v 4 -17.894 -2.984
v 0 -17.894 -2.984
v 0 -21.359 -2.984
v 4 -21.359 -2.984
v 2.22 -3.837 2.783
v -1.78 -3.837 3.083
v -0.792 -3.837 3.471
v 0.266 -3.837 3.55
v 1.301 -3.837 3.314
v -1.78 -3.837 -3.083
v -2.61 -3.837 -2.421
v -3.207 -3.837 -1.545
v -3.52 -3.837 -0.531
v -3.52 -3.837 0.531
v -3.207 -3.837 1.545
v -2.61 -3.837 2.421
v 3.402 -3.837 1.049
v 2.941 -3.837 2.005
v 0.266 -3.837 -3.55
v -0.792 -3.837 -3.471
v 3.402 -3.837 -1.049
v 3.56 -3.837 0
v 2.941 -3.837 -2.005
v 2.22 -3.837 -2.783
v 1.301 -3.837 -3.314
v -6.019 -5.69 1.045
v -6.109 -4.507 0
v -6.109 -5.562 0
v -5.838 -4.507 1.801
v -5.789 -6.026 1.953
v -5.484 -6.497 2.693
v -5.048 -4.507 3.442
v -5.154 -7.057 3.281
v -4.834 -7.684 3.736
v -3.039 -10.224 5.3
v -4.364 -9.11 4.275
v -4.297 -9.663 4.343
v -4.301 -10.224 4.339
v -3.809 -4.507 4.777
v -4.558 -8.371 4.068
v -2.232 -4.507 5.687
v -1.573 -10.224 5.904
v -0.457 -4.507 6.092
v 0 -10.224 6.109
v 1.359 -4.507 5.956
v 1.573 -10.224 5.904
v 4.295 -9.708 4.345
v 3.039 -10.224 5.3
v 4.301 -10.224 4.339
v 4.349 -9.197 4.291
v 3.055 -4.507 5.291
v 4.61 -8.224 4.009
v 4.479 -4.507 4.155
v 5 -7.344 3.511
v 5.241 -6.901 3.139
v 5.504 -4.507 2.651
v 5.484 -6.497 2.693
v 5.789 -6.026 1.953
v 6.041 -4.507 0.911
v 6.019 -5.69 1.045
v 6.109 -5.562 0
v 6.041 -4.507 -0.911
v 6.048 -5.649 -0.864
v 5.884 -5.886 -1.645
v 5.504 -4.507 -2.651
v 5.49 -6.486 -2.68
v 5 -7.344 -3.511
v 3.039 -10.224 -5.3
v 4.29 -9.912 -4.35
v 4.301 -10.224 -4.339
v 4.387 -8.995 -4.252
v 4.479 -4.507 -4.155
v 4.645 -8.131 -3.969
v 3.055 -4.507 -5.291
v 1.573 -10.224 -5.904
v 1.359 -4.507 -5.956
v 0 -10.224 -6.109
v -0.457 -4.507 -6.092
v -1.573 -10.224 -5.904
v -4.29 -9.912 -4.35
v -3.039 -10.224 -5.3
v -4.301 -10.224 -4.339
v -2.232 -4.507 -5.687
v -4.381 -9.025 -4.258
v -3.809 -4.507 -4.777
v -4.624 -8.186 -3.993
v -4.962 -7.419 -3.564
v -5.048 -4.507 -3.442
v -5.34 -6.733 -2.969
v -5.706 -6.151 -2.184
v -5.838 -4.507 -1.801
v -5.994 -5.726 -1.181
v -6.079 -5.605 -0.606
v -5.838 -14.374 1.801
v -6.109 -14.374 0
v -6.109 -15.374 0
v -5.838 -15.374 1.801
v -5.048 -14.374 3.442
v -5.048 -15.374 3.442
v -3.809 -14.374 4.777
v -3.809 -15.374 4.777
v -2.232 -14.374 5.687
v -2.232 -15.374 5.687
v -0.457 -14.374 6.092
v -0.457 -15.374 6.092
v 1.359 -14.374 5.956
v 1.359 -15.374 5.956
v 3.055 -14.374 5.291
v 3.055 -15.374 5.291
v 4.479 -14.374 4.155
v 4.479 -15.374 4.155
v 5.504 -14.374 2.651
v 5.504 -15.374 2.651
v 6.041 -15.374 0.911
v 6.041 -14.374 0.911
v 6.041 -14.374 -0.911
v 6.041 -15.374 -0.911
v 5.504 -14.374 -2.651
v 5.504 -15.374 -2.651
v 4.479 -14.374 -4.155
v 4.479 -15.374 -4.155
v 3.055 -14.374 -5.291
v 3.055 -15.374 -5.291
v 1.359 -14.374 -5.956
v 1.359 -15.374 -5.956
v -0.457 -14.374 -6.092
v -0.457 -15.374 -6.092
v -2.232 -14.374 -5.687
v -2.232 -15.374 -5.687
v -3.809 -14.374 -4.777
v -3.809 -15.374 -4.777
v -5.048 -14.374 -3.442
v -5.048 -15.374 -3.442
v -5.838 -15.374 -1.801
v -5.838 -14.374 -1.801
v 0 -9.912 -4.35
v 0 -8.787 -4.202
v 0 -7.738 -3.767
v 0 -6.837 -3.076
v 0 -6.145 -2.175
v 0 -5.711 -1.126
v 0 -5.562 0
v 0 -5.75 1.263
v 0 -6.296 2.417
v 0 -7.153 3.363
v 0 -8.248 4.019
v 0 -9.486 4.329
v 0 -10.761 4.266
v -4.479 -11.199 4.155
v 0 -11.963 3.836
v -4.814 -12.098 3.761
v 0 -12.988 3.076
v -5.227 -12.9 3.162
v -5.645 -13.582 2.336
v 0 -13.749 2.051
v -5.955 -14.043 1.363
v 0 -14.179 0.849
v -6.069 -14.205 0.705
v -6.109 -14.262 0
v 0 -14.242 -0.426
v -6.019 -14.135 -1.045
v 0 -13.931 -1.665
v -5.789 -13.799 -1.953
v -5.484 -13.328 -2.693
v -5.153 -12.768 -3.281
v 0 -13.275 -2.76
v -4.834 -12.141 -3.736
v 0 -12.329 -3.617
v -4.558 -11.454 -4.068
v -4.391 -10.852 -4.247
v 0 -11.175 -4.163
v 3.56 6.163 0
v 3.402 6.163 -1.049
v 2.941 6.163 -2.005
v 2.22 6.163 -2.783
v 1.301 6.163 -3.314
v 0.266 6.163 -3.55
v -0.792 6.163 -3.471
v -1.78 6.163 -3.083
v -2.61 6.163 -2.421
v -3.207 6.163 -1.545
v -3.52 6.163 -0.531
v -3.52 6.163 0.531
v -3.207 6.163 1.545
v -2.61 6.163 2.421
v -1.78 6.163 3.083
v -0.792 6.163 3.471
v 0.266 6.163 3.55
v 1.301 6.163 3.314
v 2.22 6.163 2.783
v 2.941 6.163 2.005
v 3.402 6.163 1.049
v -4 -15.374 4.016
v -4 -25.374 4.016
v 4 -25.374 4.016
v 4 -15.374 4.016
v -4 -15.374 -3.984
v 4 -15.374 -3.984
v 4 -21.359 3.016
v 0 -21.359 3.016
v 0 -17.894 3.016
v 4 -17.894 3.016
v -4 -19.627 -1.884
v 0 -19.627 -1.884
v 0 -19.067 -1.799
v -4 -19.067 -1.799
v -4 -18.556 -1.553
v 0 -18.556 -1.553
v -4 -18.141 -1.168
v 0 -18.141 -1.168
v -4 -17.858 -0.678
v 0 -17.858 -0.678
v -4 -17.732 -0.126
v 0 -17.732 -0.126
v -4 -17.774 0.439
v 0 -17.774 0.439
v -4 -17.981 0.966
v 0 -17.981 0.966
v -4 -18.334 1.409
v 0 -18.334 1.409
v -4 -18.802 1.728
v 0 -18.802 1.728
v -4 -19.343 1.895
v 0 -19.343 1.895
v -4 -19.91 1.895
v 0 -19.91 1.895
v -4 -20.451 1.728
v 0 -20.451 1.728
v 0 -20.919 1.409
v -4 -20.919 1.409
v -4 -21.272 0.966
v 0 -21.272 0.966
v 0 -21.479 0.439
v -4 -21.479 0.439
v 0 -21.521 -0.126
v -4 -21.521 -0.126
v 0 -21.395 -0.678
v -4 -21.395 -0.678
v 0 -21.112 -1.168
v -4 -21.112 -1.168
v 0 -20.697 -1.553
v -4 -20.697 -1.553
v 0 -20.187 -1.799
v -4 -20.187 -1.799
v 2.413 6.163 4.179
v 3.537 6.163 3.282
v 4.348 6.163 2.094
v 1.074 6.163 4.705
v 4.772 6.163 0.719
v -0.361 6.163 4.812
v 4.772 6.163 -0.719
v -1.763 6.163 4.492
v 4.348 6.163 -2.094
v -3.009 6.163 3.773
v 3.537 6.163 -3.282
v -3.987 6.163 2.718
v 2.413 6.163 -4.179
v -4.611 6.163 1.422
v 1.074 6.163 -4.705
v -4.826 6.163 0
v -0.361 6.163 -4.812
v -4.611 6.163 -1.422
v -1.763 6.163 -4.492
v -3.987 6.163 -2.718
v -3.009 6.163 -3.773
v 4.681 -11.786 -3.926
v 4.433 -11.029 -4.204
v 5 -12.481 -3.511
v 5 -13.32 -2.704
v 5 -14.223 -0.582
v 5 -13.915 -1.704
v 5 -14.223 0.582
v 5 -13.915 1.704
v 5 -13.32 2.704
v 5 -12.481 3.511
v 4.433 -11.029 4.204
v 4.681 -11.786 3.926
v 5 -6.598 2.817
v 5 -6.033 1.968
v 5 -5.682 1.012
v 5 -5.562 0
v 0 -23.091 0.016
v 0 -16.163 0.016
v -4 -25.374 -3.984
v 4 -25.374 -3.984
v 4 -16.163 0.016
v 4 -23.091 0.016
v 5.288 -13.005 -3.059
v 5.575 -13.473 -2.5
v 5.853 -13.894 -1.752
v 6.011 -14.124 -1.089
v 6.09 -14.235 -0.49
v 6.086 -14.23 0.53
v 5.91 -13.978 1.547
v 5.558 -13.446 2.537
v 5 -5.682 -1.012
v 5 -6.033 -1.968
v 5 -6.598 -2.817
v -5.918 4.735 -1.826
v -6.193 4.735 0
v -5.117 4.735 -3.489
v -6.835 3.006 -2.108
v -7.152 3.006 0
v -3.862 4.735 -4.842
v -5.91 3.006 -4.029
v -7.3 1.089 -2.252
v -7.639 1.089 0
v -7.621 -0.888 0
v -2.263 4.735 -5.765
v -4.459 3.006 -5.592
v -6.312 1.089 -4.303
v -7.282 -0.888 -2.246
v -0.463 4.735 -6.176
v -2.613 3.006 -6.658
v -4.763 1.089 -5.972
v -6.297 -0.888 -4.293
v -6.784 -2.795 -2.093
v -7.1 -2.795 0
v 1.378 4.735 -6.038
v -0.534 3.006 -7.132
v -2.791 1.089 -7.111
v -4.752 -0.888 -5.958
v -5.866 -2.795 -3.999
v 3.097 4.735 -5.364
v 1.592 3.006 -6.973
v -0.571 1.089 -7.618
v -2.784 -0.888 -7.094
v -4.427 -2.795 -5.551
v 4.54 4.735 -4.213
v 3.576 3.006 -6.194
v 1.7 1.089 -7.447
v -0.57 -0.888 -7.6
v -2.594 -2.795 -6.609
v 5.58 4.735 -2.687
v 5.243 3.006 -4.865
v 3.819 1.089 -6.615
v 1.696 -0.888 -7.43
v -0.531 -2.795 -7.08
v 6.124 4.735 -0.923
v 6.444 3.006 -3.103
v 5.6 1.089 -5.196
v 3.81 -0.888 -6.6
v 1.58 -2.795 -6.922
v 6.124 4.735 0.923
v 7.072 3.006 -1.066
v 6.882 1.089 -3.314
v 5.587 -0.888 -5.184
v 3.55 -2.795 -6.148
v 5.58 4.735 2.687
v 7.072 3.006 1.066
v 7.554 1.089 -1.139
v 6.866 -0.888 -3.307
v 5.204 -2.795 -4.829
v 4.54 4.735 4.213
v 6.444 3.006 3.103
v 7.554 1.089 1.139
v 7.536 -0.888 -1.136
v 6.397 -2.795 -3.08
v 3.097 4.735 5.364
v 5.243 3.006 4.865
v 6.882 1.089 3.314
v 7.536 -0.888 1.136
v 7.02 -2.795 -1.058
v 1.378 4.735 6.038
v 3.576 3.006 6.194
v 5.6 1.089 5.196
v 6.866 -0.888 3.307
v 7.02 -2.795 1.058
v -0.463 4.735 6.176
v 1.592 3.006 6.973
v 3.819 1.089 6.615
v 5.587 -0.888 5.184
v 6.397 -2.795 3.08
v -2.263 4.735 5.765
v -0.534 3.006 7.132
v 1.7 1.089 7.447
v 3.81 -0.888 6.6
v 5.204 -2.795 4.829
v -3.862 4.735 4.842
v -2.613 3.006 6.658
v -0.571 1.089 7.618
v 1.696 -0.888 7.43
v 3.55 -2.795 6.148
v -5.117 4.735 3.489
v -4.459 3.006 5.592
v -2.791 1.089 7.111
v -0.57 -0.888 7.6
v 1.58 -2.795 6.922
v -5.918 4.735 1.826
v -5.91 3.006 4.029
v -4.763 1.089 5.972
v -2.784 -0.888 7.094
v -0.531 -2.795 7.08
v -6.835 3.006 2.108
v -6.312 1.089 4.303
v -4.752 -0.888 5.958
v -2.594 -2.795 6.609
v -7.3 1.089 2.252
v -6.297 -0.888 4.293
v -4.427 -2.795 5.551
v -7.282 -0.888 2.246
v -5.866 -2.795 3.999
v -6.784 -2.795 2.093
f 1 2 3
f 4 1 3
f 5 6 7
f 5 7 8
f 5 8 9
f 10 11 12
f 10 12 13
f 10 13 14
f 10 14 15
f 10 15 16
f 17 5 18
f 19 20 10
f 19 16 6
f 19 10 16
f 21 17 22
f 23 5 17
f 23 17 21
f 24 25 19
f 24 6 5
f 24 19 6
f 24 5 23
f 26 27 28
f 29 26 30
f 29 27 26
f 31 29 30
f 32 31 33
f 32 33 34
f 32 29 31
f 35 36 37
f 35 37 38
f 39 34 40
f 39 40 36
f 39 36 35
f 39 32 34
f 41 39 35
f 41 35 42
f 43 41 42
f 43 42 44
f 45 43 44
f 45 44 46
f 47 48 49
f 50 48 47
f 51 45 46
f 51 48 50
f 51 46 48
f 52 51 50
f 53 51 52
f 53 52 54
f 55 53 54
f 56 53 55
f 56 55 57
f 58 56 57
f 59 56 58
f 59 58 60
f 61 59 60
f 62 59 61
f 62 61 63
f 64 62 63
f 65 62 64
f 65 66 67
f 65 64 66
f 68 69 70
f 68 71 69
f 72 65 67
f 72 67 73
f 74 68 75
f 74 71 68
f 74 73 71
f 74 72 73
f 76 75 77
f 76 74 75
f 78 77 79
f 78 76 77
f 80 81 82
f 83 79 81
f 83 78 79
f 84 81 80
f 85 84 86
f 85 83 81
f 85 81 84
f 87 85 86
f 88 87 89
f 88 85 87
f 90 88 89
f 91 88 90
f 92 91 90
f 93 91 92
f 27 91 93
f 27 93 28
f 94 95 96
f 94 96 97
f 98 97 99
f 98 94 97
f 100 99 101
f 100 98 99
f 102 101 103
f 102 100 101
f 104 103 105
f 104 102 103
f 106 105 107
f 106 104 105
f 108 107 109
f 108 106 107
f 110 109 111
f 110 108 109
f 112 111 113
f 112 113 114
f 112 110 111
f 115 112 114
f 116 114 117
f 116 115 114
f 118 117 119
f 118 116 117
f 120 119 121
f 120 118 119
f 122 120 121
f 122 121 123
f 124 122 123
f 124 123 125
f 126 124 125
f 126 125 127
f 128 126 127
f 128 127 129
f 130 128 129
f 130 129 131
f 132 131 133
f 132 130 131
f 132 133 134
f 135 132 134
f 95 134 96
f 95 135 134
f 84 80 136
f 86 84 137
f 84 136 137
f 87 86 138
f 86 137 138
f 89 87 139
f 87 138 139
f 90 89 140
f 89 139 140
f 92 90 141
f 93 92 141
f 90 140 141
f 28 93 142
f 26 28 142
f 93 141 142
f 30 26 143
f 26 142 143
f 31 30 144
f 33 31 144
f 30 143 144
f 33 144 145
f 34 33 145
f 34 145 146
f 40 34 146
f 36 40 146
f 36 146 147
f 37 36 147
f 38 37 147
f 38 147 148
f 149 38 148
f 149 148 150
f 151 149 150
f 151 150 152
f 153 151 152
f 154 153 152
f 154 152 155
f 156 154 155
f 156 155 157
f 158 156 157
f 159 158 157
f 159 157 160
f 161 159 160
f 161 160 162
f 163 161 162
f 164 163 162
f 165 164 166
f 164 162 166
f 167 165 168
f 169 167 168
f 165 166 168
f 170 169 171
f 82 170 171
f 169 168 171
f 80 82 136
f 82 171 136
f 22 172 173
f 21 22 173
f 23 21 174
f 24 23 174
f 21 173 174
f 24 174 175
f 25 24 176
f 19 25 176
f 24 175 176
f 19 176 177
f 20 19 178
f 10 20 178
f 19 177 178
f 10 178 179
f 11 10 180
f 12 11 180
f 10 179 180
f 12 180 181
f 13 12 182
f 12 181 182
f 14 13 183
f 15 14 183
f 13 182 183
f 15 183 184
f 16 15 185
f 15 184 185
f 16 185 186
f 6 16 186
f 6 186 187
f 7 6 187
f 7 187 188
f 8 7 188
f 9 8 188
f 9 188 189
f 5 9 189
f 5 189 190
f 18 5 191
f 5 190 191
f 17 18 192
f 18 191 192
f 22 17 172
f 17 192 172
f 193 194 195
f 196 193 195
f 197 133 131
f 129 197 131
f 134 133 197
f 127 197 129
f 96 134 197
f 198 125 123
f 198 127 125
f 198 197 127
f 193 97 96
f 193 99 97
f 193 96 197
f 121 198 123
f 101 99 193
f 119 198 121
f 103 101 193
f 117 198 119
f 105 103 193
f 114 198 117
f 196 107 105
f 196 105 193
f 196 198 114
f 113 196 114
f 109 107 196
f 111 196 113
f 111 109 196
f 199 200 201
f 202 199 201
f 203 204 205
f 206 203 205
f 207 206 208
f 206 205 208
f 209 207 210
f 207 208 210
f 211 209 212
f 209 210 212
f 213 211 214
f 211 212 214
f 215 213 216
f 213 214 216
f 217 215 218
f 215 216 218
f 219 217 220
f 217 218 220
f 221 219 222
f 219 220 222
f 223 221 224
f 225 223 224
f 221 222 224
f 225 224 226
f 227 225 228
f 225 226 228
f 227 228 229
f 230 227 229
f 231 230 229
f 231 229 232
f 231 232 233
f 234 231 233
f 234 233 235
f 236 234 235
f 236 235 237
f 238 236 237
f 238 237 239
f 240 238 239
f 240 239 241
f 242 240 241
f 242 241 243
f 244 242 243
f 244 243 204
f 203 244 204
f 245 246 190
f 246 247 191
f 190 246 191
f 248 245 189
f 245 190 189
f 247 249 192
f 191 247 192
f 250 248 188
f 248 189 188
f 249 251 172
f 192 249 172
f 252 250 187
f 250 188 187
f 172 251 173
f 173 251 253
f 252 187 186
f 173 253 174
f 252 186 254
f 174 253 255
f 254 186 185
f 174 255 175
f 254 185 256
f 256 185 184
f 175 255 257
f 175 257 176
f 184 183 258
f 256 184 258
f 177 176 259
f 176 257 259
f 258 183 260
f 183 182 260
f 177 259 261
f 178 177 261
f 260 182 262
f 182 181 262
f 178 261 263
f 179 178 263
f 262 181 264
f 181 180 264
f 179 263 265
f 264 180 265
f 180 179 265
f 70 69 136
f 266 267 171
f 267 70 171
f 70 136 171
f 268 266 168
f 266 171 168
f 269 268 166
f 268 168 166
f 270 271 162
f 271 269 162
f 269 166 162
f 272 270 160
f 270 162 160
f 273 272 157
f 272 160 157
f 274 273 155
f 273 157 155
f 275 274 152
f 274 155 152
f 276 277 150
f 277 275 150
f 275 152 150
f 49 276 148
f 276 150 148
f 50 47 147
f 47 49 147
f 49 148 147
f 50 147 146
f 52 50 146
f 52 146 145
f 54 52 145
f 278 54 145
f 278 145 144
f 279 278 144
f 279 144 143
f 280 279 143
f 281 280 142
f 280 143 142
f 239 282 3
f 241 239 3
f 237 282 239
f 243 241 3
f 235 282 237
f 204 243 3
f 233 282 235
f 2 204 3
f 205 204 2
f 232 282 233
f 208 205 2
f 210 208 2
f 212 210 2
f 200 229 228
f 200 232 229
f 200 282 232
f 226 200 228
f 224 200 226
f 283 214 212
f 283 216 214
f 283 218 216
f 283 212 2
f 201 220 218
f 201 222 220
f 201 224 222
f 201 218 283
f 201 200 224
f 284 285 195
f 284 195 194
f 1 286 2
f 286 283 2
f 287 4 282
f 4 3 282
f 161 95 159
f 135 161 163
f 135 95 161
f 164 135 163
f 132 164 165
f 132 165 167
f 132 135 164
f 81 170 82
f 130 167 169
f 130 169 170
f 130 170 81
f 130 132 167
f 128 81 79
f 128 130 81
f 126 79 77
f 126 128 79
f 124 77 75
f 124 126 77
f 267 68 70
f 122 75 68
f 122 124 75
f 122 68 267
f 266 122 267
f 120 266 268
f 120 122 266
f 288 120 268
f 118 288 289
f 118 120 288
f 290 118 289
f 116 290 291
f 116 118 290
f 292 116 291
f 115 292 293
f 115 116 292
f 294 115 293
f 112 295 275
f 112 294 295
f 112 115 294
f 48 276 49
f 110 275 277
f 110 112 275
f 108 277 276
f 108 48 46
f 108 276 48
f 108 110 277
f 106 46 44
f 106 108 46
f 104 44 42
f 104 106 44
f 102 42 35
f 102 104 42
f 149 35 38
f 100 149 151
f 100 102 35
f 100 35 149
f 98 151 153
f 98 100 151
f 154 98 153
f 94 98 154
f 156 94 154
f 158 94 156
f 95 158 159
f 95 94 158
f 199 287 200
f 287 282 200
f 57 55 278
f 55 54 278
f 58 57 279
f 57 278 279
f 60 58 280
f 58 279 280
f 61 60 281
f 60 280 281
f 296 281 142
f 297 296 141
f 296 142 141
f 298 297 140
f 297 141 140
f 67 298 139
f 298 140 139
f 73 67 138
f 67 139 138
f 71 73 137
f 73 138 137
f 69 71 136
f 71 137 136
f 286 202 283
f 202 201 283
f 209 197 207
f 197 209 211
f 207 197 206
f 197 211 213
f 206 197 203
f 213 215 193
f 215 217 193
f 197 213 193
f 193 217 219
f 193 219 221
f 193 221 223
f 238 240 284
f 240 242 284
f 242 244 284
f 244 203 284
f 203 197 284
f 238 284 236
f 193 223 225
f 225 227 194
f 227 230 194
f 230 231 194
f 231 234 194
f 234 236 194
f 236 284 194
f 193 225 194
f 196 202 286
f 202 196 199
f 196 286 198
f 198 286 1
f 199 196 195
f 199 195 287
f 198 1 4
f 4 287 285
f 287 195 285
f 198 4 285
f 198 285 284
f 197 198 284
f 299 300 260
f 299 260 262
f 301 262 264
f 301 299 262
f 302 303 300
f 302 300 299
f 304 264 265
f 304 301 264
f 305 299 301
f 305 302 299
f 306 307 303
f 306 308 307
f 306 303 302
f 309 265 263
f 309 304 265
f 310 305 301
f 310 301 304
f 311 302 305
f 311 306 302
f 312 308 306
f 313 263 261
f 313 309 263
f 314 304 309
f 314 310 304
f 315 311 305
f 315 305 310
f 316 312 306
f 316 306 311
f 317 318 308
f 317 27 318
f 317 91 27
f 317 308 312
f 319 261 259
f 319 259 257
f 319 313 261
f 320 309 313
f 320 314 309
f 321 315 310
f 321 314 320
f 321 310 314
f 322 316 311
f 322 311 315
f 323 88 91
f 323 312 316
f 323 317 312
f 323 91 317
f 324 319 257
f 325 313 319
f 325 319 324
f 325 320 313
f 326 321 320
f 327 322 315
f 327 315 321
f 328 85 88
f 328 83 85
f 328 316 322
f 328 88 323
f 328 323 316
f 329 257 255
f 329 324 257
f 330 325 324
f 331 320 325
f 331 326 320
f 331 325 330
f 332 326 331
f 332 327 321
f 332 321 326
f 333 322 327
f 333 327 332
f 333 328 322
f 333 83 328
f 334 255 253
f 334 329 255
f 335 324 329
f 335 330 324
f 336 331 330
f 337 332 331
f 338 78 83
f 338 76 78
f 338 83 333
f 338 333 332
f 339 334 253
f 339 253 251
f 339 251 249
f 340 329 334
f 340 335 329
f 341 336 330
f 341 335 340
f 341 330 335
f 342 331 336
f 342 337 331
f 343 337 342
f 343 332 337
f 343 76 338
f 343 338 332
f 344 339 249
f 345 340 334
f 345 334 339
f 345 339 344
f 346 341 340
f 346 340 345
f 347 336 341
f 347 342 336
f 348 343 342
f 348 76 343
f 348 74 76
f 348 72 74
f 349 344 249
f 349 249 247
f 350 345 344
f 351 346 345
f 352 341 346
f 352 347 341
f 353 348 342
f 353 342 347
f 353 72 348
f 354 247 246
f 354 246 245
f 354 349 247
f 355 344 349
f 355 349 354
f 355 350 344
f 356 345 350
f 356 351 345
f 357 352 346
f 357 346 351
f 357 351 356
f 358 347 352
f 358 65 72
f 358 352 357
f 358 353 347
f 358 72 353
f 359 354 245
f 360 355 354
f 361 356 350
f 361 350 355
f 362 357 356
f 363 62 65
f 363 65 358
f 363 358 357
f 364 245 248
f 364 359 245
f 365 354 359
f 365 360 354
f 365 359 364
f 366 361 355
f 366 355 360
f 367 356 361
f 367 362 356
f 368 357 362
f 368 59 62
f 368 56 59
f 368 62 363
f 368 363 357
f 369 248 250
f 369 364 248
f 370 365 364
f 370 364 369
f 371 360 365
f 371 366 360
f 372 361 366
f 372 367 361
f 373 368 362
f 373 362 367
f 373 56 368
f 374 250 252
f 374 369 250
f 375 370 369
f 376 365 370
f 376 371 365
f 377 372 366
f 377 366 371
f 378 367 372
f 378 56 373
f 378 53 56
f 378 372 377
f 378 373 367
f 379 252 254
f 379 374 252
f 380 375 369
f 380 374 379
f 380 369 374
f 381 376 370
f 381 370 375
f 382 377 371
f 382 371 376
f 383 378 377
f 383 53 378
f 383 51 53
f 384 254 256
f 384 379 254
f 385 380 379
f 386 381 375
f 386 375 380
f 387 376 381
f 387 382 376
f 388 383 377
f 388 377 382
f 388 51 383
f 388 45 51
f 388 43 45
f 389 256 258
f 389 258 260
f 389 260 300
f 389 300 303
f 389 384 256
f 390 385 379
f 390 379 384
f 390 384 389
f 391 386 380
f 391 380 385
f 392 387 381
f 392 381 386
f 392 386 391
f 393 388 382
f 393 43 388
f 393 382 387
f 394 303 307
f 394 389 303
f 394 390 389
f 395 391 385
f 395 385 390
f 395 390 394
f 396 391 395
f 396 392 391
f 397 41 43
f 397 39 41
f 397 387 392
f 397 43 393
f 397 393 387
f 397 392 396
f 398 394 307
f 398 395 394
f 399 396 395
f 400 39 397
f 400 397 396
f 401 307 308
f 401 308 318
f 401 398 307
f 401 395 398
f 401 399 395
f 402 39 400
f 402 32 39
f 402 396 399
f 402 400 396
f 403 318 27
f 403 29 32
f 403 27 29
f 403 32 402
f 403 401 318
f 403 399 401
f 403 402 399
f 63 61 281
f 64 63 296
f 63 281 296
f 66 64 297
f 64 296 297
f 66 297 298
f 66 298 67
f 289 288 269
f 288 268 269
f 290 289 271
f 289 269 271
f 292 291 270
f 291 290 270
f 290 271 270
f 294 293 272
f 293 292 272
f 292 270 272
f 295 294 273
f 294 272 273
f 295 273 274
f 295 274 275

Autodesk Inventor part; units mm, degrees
ref_plane "YZ Plane" through (0, 0, 0) normal (1, 0, 0) x (0, 1, 0)
ref_plane "XZ Plane" through (0, 0, 0) normal (0, 1, 0) x (-1, 0, 0)
ref_plane "XY Plane" through (0, 0, 0) normal (0, 0, 1) x (1, 0, 0)
sketch "Sketch1" plane through (0, 0, 0) normal (0, 0, 1) x (1, 0, 0)
  line L0 (0, 6.1628) -> (0, 4.6128)
  line L1 (0, 0) -> (0, -5.3285)
  line L2 (0, -7.6236) -> (0, 6.1628)
  line L3 (7.7918, 0) -> (42.6907, 0)
  line L4 (6.1094, -12.088) -> (6.1094, -4.669)
  line L5 (-6.1094, -10.2236) -> (-6.1094, -4.5067)
  line L6 (0, -7.6236) -> (0, -10.2236)
  line L7 (0, -7.6236) -> (0, -5.0236) construction
  arc A0 (-6.1094, 5.0092) -> (-6.87, -3.5101) centre (0, 0.1701) ccw
  arc A1 (6.1094, -4.669) -> (4.9829, 6.1628) centre (0, 0.1701) ccw
  circle A2 centre (27.3823, 0) radius 1.6
  circle A3 centre (27.3823, 0) radius 1.6
  arc A4 (15.7262, -19.2861) -> (15.9651, 19.4308) centre (0.0053, 0.1701) ccw
  arc A5 (14.9776, -18.1086) -> (14.9776, 18.1086) centre (0, 0) ccw construction
  line L8 (25.0186, 0.0157) -> (19.4598, 0.0157) construction
  line L9 (22.9824, -8.2534) -> (24.1975, 0.0157) construction
  line L10 (24.1975, 0.0157) -> (22.8643, 8.3172) construction
  line L11 (28.9823, 0) -> (30.9823, 0) construction
  line L12 (33.1204, -3.5101) -> (30.9986, 0.1649)
  line L13 (39.4857, -3.5101) -> (33.1204, -3.5101)
  line L14 (39.4857, 0.1649) -> (37.3639, -3.5101)
  circle A6 centre (35.2258, 0) radius 1.9
  line L15 (30.9986, 0.1649) -> (33.1239, 3.846)
  line L16 (33.1239, 3.846) -> (39.4857, 3.8504)
  line L17 (37.3639, 3.8489) -> (39.4857, 0.1649)
  line L18 (39.4857, 0.1784) -> (39.4857, 3.8504)
  line L19 (39.4857, 3.8504) -> (39.4857, -3.5101)
  line L20 (39.4857, 3.8504) -> (39.4857, 5.8504)
  line L21 (39.4857, 5.8504) -> (23.6696, 8.2698)
  arc A7 (15.7262, -19.2861) -> (15.9651, 19.4308) centre (0, 0.1701) ccw
  line L22 (39.4857, -3.5101) -> (39.4857, -5.5101)
  line L23 (39.4857, -5.5101) -> (23.6696, -7.9296)
  line L24 (23.6696, -7.9296) -> (23.6696, 8.2698)
  line L25 (0, 6.1628) -> (0, -10.2236)
  line L26 (0, -12.323) -> (0, -15.7561)
  line L27 (10.9155, -5.0236) -> (17.2808, -5.0236)
  line L28 (17.2808, -8.6986) -> (15.159, -12.3736)
  circle A8 centre (13.0373, -8.6986) radius 1.9
  line L29 (8.7937, -8.6986) -> (10.9155, -5.0236)
  line L30 (17.2808, -12.3736) -> (10.9155, -12.3736)
  line L31 (10.9155, -12.3736) -> (8.7937, -8.6986)
  line L32 (15.159, -5.0236) -> (17.2808, -8.6986)
  line L33 (10.9155, -12.3736) -> (10.9155, -14.3736)
  line L34 (-6.1094, -10.2236) -> (-6.1094, -14.3736)
  line L35 (0, -14.3736) -> (0, -10.2236)
  line L36 (0, -14.3736) -> (0, -19.3736)
  line L37 (-6.1094, -19.3736) -> (-6.1094, -14.3736)
  line L38 (0, -19.3736) -> (0, -25.3736)
  line L39 (0, -25.3736) -> (-6.1094, -25.3736)
  line L40 (-6.1094, -25.3736) -> (-6.1094, -19.3736)
  arc A9 (-4.8255, 6.1628) -> (-6.1094, -4.5067) centre (0, 0.1701) ccw
  line L41 (-5.029, 6.1628) -> (-4.9829, 6.1628)
  line L42 (-4.8255, 6.1628) -> (0, 6.1628)
  dimension "d2" = 3.8
  dimension "d3" = 2
  dimension "d4" = 2
  dimension "d5" = 16
  dimension "d6" = 2
  dimension "d7" = 16
  dimension "d9" = 3.8
  dimension "d10" = 2
  dimension "d17" = 5
  dimension "d50" = 6
  dimension "d64" = 7.7937
  dimension "d65" = 15.388
revolve "Revolution1" add sketch "Sketch1" angle 360 about axis through (0, -12.323, 0) along (0, -1, 0) contours L0 L2 L1 L6 L35 L26 L36 L38 L39 L40 L37 L34 L5 A9 L42
sketch "Sketch2" plane through (0, 0, 0) normal (1, 0, 0) x (0, 1, 0)
  line L0 (-4.669, 0) -> (-6.7907, -3.675) construction
  line L1 (-6.7907, 3.675) -> (-4.669, 0) construction
  line L2 (-15.156, 0) -> (-13.156, 0) construction
  line L3 (-11.0343, -3.675) -> (-6.7907, -3.675) construction
  line L4 (-4.5067, -6.1094) -> (-4.5067, 6.1094) construction
  line L5 (-4.5067, -6.1094) -> (-4.5067, 6.1094) construction
  line L6 (-48.8073, 0) -> (-58.5119, 0) construction
  line L7 (-8.9125, 0) -> (-6.3144, -1.5) construction
  line L8 (-17.8945, -2.9836) -> (-21.3586, -2.9836)
  line L9 (-21.3586, -2.9836) -> (-23.0907, 0.0164)
  line L10 (-23.0907, 0.0164) -> (-21.3586, 3.0164)
  line L11 (-21.3586, 3.0164) -> (-17.8945, 3.0164)
  line L12 (-17.8945, 3.0164) -> (-16.1625, 0.0164)
  line L13 (-16.1625, 0.0164) -> (-17.8945, -2.9836)
  line L14 (23.6533, 6.6124) -> (23.3606, 8.9041) construction
  line L15 (29.9823, 11.5805) -> (34.9823, 11.5805) construction
  line L16 (24.1789, 0) -> (22.8458, 8.3015) construction
  line L17 (25, 0) -> (19.4412, 0) construction
  line L18 (25.1551, -0.0164) -> (29.5051, -0.0164) construction
  line L19 (23.6533, -6.0645) -> (23.6533, 6.6124) construction
  arc A0 (14.9776, -18.1086) -> (14.9776, 18.1086) centre (0, 0) ccw construction
  arc A1 (18.0021, -17.3472) -> (18.0021, 17.3472) centre (0, 0) ccw construction
  arc A2 (18.0021, -17.3472) -> (18.0021, 17.3472) centre (0, 0) ccw construction
  line L20 (22.9638, -8.2692) -> (24.1789, 0) construction
  circle A3 centre (29.5051, -0.0164) radius 4.35 construction
  line L21 (43.4694, -5.828) -> (23.3606, -8.9041) construction
  line L22 (43.4694, 5.828) -> (23.3606, 8.9041) construction
  line L23 (37.4871, -3) -> (35.7551, 0) construction
  line L24 (35.7551, 0) -> (37.4871, 3) construction
  line L25 (43.4694, 5.828) -> (43.4694, -5.828) construction
  circle A4 centre (39.2192, 0) radius 1.9 construction
  line L26 (25, 0) -> (20.4835, 0) construction
  line L27 (23.6533, -6.0645) -> (23.3606, -8.9041) construction
  line L28 (43.4694, 0) -> (43.4694, 5.828) construction
  line L29 (43.4694, -5.828) -> (43.4694, 5.828) construction
  line L30 (29.5346, 0.0703) -> (29.5346, 0.0867) construction
  line L31 (37.4871, 3) -> (43.4694, 3.5234) construction
  line L32 (37.4871, -3) -> (43.4694, -3.5234) construction
  circle A5 centre (-17.0481, 18.2856) radius 1.75
  line L33 (-15.4481, 18.2856) -> (-13.4481, 18.2856) construction
  line L34 (-11.3263, 14.6106) -> (-13.4481, 18.2856) construction
  line L35 (-13.4481, 18.2856) -> (-11.3263, 21.9606) construction
  circle A6 centre (-9.2045, 18.2856) radius 1.9
  line L36 (-4.961, 18.2856) -> (-7.0828, 14.6106) construction
  line L37 (-7.0828, 21.9606) -> (-4.961, 18.2856) construction
  line L38 (-11.3263, 21.9606) -> (-7.0828, 21.9606) construction
  line L39 (-11.3263, 14.6106) -> (-7.0828, 14.6106) construction
  line L40 (-9.2045, 18.2856) -> (-6.6065, 16.7856)
  line L41 (-7.4725, 15.2856) -> (-10.9366, 15.2856)
  line L42 (-10.9366, 15.2856) -> (-12.6686, 18.2856)
  line L43 (-12.6686, 18.2856) -> (-10.9366, 21.2856)
  line L44 (-10.9366, 21.2856) -> (-7.4725, 21.2856)
  line L45 (-7.4725, 21.2856) -> (-5.7404, 18.2856)
  line L46 (-5.7404, 18.2856) -> (-7.4725, 15.2856)
  circle A7 centre (-19.6266, 0.0164) radius 1.9 construction
  circle A8 centre (-9.9125, 0) radius 4.35
  line L47 (-8.9125, 0) -> (-9.9125, 0)
  line L48 (-8.9125, 0) -> (-7.9125, 0) construction
  line L49 (-23.0907, 0.0164) -> (-25.0907, 0.0164)
  point P0 (23.6533, 8.0944)
  point P1 (23.6533, -8.0944)
  point P2 (39.2192, 3)
  point P3 (39.2192, 0)
  point P4 (43.4694, -3)
  point P5 (43.4694, 3)
  dimension "d37" = 3
  dimension "d42" = 3.8
  dimension "d43" = 2
  dimension "d44" = 3.5
  dimension "d45" = 7.35
  dimension "d46" = 3
  dimension "d47" = 1
  dimension "d48" = 180
  dimension "d49" = 2
extrude "Extrusion1" cut sketch "Sketch2" along normal blind 10 contours L8 L9 L10 L11 L12 L13 | A8
sketch "Sketch4" plane through (0, 0, 0) normal (1, 0, 0) x (0, 0, -1)
  line L0 (0, -15.156) -> (0, -13.156) construction
  line L1 (0, -4.669) -> (3.675, -6.7907) construction
  line L2 (-3.675, -6.7907) -> (0, -4.669) construction
  line L3 (3.675, -11.0343) -> (3.675, -6.7907) construction
  line L4 (6.1094, -4.669) -> (-6.1094, -4.669) construction
  line L5 (6.1094, -4.669) -> (-6.1094, -4.669) construction
  line L6 (0, -8.9125) -> (1.5, -6.3144) construction
  line L7 (2.9836, -17.8945) -> (2.9836, -21.3586)
  line L8 (2.9836, -21.3586) -> (-0.0164, -23.0907)
  line L9 (-0.0164, -23.0907) -> (-3.0164, -21.3586)
  line L10 (-3.0164, -21.3586) -> (-3.0164, -17.8945)
  line L11 (-3.0164, -17.8945) -> (-0.0164, -16.1625)
  line L12 (-0.0164, -16.1625) -> (2.9836, -17.8945)
  circle A0 centre (-0.0164, -19.6266) radius 1.9
  circle A1 centre (0, -9.9125) radius 4.35
  line L13 (0, -8.9125) -> (0, -9.9125)
  line L14 (0, -8.9125) -> (0, -7.9125) construction
  line L15 (-0.0164, -23.0907) -> (-0.0164, -25.0907)
  point P0 (0, -4.669)
  point P1 (6.1094, -4.669)
  point P2 (-6.1094, -4.669)
  point P3 (-0.0164, -23.0907)
  dimension "d51" = 3
  dimension "d52" = 1
  dimension "d53" = 180
  dimension "d54" = 2
extrude "Extrusion2" cut sketch "Sketch4" against normal blind 10 and the other way blind 5 contours A0 | A1
sketch "Sketch7" plane through (0, -25.3736, 0) normal (0, -1, 0) x (1, 0, 0)
  line L0 (0, 0.0164) -> (6.1094, 0.0164) construction
  line L1 (0, 0.0164) -> (-4, 0.0164) construction
  line L2 (-4, 0.0164) -> (-4, 4.0164) construction
  line L3 (-4, 4.0164) -> (0, 4.0164) construction
  line L4 (0, 4.0164) -> (0, 0.0164) construction
  line L5 (-4, 4.0164) -> (4, 4.0164)
  line L6 (4, 4.0164) -> (4, -3.9836)
  line L7 (4, -3.9836) -> (-4, -3.9836)
  line L8 (-4, -3.9836) -> (-4, 4.0164)
  line L9 (-4, -9.4779) -> (-8.9104, -9.4779)
  line L10 (-8.9104, -9.4779) -> (-8.9104, 10.8185)
  line L11 (-8.9104, 10.8185) -> (-4, 10.8185)
  line L12 (-4, 10.8185) -> (-4, -9.4779)
  line L13 (-7.8642, 4.0164) -> (7.4627, 4.0164)
  line L14 (7.4627, 4.0164) -> (7.4627, 9.8769)
  line L15 (7.4627, 9.8769) -> (-7.8642, 9.8769)
  line L16 (-7.8642, 9.8769) -> (-7.8642, 4.0164)
  line L17 (4, -8.5624) -> (10.7059, -8.5624)
  line L18 (10.7059, -8.5624) -> (10.7059, 4.0164)
  line L19 (10.7059, 4.0164) -> (4, 4.0164)
  line L20 (4, 4.0164) -> (4, -8.5624)
  line L21 (4, -12.198) -> (-4, -12.198)
  line L22 (-4, -12.198) -> (-4, -3.9836)
  line L23 (-4, -3.9836) -> (4, -3.9836)
  line L24 (4, -3.9836) -> (4, -12.198)
  dimension "d70" = 4
  dimension "d71" = 4
  dimension "d72" = 8
  dimension "d73" = 8
extrude "Extrusion5" cut sketch "Sketch7" against normal blind 10 contours L12 L15 L14 L13 L5 | L13 L16 L15 L12 | L8 L12 L9 L10 L11 L15 L16 L13 | L13 L19 L18 L17 L20 L6 | L7 L20 L24 L21 L22 L12
sketch "Sketch8" plane through (0, 6.1628, 0) normal (0, 1, 0) x (1, 0, 0)
  circle A0 centre (0, 0) radius 3.56
  dimension "d66" = 7.12
extrude "Extrusion6" cut sketch "Sketch8" against normal blind 10
properties part number "Now as three Part 2"
